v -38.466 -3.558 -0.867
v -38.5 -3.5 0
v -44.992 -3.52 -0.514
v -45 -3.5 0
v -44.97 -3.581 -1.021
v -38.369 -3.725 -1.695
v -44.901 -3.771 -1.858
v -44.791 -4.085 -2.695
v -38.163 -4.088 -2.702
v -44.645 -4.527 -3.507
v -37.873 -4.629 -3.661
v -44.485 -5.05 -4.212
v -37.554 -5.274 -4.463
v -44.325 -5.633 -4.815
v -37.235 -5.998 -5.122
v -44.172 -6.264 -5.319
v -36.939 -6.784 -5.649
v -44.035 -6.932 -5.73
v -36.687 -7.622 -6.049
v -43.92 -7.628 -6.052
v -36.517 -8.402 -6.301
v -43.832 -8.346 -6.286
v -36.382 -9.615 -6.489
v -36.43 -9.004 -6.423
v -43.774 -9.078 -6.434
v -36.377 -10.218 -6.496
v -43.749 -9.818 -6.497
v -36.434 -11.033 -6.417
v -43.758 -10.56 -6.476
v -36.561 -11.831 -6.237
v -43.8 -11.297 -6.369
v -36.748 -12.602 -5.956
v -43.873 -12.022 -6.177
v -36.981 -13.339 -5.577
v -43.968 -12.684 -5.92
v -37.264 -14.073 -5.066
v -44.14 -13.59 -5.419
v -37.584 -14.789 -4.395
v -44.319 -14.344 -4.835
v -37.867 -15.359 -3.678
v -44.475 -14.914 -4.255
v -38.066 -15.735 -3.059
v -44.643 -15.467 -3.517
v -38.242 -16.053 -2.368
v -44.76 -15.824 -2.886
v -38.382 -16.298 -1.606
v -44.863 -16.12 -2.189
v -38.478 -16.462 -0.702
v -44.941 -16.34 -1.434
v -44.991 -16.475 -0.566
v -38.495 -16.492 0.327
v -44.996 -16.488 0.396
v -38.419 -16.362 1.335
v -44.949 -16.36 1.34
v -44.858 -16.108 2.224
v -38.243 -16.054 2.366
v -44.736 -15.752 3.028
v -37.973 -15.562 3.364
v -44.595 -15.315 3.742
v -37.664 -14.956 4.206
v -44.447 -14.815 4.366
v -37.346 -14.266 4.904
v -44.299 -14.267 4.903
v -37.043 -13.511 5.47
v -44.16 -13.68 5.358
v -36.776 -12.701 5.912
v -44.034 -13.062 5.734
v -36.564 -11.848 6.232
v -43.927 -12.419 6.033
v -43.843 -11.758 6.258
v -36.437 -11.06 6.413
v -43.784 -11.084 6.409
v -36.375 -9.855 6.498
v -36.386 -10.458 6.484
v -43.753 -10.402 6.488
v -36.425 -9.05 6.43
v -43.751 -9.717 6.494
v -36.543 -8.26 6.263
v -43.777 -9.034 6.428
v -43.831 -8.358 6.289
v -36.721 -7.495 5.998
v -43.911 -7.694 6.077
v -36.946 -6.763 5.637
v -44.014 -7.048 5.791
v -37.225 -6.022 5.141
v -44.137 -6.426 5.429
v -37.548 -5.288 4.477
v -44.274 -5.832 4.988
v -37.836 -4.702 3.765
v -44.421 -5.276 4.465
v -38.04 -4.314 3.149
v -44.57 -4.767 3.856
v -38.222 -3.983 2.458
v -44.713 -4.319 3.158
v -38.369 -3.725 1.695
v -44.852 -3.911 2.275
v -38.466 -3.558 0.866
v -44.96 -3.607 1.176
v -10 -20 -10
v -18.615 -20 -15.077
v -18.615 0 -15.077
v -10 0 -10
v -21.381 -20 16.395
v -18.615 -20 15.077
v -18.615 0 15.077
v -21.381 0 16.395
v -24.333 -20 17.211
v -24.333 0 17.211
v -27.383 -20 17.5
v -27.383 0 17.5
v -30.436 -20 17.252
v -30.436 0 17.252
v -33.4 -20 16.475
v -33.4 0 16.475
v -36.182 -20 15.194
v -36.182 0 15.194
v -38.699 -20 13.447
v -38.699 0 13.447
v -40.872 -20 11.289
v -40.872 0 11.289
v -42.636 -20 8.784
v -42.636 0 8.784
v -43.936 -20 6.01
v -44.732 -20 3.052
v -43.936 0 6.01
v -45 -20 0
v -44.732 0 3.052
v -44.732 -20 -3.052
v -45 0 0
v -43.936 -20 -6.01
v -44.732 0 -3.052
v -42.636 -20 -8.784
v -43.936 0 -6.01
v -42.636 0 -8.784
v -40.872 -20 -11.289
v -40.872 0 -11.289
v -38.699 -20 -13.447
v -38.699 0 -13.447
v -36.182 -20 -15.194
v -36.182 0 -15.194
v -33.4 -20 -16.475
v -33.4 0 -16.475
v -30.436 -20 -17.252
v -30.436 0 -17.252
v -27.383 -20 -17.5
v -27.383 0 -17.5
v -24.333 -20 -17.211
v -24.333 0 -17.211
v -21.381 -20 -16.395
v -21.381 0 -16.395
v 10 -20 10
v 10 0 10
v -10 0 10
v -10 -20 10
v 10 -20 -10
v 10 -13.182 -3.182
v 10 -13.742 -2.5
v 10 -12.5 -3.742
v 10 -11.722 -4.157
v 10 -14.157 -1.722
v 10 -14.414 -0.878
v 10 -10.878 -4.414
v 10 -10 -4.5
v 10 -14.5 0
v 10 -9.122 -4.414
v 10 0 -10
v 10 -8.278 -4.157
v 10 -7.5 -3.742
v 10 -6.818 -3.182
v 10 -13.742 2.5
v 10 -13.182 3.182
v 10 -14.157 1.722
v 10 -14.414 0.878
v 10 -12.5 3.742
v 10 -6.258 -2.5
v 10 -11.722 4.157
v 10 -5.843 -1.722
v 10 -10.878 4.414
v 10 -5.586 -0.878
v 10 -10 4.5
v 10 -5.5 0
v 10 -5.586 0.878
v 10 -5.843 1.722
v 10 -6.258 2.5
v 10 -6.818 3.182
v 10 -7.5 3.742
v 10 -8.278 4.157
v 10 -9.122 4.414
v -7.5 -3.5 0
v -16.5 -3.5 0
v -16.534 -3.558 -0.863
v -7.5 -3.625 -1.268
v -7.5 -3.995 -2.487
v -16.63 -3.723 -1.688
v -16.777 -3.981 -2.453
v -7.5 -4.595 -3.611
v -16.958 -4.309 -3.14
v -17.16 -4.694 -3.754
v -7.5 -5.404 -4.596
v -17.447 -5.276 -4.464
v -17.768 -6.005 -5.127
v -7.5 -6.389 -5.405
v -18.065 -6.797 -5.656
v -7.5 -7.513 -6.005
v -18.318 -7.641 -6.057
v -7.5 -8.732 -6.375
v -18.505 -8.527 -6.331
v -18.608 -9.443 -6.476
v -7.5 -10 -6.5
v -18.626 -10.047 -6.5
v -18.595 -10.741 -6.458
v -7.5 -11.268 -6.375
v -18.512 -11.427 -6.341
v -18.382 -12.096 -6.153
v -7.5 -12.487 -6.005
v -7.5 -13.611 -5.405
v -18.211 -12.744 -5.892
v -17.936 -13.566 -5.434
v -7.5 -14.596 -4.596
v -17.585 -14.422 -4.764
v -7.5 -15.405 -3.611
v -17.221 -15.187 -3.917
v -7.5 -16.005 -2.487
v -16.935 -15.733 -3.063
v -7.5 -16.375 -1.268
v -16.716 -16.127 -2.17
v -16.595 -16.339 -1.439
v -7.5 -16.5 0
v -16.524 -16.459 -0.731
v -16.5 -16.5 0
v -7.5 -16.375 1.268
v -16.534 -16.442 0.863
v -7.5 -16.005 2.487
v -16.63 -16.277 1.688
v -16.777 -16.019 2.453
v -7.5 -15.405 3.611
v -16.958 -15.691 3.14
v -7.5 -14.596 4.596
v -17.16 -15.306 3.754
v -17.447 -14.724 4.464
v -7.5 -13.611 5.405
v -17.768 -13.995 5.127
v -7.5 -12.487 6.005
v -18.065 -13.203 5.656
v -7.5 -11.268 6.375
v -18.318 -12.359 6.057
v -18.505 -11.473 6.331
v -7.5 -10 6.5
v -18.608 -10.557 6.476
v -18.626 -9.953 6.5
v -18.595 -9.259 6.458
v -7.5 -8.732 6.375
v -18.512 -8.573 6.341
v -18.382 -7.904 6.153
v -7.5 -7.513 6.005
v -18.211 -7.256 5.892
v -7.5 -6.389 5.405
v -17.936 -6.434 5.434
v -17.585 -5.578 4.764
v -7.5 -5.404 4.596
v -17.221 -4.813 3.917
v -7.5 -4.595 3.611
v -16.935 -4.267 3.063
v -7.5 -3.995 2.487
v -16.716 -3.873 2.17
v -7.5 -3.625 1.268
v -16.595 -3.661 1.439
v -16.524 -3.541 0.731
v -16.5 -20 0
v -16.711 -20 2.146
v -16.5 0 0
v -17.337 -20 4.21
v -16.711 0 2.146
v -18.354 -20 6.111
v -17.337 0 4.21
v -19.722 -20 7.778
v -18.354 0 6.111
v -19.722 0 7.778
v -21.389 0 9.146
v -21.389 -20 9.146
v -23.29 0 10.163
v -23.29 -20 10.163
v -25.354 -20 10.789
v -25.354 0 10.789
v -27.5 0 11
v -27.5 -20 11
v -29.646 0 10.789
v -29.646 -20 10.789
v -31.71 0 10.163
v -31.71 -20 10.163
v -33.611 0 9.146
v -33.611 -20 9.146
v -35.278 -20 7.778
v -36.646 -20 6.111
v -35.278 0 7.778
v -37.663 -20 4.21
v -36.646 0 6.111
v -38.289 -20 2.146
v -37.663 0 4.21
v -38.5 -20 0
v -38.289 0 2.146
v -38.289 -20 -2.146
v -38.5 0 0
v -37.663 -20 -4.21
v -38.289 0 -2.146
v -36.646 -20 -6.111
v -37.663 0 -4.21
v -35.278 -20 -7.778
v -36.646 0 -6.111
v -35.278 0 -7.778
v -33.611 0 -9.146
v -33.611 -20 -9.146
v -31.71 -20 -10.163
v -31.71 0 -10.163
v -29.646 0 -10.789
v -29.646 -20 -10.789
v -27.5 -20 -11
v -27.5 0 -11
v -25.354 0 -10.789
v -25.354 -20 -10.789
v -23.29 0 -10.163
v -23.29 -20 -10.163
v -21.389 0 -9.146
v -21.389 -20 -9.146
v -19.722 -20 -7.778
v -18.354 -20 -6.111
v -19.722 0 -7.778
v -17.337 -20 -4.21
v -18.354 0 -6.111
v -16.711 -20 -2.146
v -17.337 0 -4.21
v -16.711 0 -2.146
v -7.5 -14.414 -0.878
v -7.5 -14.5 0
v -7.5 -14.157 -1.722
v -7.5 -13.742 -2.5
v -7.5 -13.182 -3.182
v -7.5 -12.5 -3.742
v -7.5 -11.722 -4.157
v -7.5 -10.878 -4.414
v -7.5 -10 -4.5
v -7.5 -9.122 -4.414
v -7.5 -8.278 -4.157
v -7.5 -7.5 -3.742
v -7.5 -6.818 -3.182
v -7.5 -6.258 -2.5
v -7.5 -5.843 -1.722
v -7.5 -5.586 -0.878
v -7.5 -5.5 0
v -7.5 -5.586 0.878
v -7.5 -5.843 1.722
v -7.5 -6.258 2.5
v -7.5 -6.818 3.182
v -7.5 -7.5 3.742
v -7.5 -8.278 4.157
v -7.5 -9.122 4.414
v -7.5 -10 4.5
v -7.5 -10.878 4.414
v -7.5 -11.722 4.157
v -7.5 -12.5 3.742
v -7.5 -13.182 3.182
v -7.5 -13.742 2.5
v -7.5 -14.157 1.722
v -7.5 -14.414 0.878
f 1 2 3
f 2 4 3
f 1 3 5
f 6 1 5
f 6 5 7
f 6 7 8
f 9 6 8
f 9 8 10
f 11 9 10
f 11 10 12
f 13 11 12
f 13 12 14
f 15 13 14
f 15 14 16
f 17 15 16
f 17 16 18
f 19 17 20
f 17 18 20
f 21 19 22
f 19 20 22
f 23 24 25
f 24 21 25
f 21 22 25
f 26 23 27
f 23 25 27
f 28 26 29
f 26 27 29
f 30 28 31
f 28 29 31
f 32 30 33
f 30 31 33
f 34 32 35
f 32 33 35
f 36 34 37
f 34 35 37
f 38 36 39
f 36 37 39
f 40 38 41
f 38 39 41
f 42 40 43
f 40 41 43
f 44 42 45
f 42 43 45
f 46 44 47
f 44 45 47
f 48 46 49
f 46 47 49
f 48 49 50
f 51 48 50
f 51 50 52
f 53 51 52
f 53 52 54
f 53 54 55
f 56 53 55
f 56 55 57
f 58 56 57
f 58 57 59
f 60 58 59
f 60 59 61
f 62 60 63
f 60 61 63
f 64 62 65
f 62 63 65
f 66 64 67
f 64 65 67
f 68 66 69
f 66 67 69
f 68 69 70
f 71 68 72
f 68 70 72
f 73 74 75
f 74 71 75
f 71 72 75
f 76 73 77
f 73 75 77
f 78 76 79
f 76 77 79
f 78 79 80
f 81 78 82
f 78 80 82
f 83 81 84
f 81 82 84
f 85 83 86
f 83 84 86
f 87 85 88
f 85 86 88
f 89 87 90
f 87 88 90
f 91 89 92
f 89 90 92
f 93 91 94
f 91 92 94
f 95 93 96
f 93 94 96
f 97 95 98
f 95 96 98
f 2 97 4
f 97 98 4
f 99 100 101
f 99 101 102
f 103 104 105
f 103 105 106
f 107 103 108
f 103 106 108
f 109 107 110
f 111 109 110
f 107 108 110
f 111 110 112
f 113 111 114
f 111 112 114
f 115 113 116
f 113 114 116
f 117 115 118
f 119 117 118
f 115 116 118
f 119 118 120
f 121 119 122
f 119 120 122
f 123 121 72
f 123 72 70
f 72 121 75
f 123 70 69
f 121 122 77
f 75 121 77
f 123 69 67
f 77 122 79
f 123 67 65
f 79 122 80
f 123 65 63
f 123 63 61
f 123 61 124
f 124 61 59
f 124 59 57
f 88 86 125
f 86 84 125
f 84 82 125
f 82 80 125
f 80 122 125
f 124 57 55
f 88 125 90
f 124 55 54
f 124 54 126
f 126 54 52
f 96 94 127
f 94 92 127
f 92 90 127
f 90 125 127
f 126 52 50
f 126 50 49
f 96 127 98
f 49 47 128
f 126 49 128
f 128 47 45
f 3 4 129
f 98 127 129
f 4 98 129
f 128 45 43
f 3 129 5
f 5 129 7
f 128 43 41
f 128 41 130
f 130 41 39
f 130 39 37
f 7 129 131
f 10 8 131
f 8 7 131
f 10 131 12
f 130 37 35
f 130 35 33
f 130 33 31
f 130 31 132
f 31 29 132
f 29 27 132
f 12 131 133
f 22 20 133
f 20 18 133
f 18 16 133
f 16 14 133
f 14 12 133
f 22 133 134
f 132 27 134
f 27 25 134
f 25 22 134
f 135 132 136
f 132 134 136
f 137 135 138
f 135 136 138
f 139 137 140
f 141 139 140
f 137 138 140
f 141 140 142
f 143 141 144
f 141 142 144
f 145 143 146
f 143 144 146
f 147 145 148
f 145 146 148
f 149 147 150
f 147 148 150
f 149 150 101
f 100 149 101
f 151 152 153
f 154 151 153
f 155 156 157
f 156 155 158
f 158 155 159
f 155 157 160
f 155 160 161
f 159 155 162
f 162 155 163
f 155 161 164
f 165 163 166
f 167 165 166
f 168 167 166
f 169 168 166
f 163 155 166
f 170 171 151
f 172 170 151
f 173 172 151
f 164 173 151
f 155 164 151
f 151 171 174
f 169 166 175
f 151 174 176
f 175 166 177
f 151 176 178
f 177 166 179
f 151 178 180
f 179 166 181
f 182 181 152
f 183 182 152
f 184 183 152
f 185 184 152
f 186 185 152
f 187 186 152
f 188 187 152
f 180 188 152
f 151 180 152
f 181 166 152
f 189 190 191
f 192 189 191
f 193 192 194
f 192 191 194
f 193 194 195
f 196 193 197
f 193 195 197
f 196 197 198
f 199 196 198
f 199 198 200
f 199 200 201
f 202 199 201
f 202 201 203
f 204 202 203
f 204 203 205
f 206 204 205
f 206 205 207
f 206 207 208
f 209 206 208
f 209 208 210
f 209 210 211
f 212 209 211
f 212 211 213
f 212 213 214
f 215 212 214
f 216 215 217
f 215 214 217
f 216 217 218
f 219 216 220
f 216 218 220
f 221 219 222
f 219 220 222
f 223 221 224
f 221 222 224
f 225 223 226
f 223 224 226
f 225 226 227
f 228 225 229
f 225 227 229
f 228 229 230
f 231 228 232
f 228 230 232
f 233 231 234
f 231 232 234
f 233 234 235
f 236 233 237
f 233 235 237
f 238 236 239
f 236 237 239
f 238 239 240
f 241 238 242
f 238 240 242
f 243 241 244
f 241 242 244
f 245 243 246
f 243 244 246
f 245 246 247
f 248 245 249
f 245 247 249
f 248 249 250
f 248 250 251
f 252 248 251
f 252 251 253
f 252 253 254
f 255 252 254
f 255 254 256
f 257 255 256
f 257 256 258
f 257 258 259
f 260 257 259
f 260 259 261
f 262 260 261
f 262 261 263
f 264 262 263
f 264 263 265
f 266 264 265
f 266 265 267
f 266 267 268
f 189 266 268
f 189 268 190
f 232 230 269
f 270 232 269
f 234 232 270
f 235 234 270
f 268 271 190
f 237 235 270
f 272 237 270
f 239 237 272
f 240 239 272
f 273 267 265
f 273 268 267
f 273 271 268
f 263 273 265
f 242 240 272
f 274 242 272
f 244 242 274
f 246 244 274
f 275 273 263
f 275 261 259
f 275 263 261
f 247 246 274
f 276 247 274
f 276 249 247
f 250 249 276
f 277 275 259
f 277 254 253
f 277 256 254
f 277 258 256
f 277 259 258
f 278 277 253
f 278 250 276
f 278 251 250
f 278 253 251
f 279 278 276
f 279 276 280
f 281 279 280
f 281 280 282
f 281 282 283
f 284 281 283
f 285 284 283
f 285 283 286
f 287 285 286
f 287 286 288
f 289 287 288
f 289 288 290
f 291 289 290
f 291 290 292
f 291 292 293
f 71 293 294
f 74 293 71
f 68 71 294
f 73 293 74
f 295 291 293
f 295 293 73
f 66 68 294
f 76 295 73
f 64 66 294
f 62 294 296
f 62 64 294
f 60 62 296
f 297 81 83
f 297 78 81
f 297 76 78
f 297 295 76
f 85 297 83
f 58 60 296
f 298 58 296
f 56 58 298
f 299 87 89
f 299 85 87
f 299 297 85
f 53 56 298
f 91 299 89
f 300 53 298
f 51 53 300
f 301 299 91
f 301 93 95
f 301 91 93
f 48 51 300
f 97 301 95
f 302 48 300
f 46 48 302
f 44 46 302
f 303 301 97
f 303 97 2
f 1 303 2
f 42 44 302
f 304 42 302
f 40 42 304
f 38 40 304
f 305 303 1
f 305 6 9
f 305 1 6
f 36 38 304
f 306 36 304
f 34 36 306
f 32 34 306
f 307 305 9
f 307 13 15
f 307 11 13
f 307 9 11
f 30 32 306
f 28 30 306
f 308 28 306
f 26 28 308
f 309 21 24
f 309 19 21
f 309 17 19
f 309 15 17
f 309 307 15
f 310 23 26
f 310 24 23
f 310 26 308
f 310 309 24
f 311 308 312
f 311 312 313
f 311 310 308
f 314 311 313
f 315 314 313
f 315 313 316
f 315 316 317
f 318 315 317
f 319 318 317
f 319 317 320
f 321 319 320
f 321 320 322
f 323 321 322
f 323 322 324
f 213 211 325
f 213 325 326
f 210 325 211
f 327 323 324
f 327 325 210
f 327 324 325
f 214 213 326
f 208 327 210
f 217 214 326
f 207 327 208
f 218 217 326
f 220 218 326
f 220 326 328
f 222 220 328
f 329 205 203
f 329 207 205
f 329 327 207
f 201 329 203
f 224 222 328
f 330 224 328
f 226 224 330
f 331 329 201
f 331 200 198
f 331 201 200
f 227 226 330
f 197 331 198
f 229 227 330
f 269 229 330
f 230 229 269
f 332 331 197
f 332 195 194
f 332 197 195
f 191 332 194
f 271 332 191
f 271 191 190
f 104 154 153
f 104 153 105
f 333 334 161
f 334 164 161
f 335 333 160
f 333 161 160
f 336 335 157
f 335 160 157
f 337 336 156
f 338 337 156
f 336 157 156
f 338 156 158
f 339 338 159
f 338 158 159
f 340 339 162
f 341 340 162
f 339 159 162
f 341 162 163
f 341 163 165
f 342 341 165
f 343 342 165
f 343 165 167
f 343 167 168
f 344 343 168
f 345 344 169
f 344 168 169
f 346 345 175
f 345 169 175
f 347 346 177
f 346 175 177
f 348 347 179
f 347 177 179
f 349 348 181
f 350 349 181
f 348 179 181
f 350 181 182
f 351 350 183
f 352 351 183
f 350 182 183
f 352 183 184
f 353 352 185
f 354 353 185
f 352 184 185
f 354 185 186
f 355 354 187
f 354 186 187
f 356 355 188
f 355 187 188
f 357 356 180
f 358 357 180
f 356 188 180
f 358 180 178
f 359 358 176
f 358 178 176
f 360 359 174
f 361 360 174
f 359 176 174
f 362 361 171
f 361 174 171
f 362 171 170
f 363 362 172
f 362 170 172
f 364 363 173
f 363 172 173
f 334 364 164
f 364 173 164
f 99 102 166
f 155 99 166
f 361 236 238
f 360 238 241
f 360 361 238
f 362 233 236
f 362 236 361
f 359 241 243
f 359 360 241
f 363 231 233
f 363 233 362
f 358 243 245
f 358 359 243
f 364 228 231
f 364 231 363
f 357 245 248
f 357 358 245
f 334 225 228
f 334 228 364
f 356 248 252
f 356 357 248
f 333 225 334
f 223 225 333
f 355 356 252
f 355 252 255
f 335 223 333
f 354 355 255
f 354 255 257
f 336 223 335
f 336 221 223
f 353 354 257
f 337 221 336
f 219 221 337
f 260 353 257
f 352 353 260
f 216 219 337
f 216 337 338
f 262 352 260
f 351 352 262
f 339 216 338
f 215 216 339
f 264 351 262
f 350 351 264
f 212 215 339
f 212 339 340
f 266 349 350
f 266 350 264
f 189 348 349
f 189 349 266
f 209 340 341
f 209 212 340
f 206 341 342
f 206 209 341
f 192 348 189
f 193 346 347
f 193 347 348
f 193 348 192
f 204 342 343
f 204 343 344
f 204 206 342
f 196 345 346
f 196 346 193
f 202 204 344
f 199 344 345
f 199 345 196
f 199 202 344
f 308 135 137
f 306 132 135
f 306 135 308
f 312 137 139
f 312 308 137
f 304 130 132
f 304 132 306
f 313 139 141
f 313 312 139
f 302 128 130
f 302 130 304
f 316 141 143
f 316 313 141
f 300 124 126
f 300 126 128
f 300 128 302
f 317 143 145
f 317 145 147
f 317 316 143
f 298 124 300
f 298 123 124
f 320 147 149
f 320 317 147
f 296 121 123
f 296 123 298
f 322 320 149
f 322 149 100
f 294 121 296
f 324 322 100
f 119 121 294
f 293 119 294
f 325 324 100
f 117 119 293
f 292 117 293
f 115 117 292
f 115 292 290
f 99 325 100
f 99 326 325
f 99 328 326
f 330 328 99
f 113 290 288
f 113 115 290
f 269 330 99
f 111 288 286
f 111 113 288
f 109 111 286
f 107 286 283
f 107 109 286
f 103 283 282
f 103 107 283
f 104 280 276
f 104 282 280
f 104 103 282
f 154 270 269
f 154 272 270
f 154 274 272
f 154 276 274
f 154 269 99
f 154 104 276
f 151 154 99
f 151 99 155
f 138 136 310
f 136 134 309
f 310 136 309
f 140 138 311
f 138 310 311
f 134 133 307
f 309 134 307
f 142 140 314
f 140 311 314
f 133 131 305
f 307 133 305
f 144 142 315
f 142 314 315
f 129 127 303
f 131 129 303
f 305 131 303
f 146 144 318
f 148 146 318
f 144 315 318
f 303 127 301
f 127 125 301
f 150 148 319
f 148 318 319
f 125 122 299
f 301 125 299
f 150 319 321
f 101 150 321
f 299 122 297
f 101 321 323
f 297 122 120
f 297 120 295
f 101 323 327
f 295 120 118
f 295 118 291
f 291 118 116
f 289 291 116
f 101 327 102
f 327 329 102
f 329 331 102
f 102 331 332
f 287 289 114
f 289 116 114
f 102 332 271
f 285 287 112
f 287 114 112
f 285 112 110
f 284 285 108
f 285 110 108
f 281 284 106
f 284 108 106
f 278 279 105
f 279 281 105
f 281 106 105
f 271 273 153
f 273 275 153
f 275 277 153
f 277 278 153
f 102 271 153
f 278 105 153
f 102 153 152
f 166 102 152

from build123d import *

# Parameters (mm, degrees)
F0_R           = 11
F1_DEPTH       = 20
F5_D           = 9
F5_START       = 3.5000001
F5_CBORE_D     = 13
F5_CBORE_DEPTH = 9
F9_D           = 13
F9_DEPTH       = 20
F9_START       = 1.2519233
F9_TIP         = 3.9055940237


with BuildPart() as f1:
    # F0 (on Front) → F1 (new body)
    with BuildSketch(Plane.XZ):
        with BuildLine():
            ThreePointArc((-18.6153846154, -15.0769230769), (-12.3057450128, -8.6824314212), (-10, 0))
            ThreePointArc((-10, 0), (-12.3057450128, 8.6824314212), (-18.6153846154, 15.0769230769))
            ThreePointArc((-18.6153846154, 15.0769230769), (-45, 0), (-18.6153846154, -15.0769230769))
        make_face()
        with Locations((-27.5, 0)):
            Circle(F0_R, mode=Mode.SUBTRACT)
        with BuildLine():
            ThreePointArc((-18.6153846154, 15.0769230769), (-12.3057450128, 8.6824314212), (-10, 0))
            Line((-10, 0), (-10, 10))
            Line((-10, 10), (-18.6153846154, 15.0769230769))
        make_face()
        with BuildLine():
            Line((-18.6153846154, -15.0769230769), (-10, -10))
            Line((-10, -10), (-10, 0))
            ThreePointArc((-10, 0), (-12.3057450128, -8.6824314212), (-18.6153846154, -15.0769230769))
        make_face()
        Polygon((-10, -10), (10, -10), (10, 10), (-10, 10), (-10, 0), align=None)
    extrude(amount=F1_DEPTH)

    # F5 (through all)
    # its depths count from where the whole tool has entered the part; down to there all is cleared
    with Locations(Plane(origin=(-20, 0, 0), x_dir=(0, 1, 0), z_dir=(-1, 0, 0)).offset(-F5_START)):
        with Locations((-10, 0)):
            CounterBoreHole(F5_D / 2, F5_CBORE_D / 2, F5_CBORE_DEPTH)

    # F9
    # its depths count from where the whole tool has entered the part; down to there all is cleared
    with Locations(Plane(origin=(-45, 0, 0), x_dir=(0, 1, 0), z_dir=(-1, 0, 0)).offset(-F9_START)):
        with Locations((-10, 0)):
            Hole(F9_D / 2, depth=F9_DEPTH)
            with Locations((0, 0, -(F9_DEPTH + F9_TIP / 2))):  # 118° drill point
                Cone(0, F9_D / 2, F9_TIP, mode=Mode.SUBTRACT)


solid = f1.part
